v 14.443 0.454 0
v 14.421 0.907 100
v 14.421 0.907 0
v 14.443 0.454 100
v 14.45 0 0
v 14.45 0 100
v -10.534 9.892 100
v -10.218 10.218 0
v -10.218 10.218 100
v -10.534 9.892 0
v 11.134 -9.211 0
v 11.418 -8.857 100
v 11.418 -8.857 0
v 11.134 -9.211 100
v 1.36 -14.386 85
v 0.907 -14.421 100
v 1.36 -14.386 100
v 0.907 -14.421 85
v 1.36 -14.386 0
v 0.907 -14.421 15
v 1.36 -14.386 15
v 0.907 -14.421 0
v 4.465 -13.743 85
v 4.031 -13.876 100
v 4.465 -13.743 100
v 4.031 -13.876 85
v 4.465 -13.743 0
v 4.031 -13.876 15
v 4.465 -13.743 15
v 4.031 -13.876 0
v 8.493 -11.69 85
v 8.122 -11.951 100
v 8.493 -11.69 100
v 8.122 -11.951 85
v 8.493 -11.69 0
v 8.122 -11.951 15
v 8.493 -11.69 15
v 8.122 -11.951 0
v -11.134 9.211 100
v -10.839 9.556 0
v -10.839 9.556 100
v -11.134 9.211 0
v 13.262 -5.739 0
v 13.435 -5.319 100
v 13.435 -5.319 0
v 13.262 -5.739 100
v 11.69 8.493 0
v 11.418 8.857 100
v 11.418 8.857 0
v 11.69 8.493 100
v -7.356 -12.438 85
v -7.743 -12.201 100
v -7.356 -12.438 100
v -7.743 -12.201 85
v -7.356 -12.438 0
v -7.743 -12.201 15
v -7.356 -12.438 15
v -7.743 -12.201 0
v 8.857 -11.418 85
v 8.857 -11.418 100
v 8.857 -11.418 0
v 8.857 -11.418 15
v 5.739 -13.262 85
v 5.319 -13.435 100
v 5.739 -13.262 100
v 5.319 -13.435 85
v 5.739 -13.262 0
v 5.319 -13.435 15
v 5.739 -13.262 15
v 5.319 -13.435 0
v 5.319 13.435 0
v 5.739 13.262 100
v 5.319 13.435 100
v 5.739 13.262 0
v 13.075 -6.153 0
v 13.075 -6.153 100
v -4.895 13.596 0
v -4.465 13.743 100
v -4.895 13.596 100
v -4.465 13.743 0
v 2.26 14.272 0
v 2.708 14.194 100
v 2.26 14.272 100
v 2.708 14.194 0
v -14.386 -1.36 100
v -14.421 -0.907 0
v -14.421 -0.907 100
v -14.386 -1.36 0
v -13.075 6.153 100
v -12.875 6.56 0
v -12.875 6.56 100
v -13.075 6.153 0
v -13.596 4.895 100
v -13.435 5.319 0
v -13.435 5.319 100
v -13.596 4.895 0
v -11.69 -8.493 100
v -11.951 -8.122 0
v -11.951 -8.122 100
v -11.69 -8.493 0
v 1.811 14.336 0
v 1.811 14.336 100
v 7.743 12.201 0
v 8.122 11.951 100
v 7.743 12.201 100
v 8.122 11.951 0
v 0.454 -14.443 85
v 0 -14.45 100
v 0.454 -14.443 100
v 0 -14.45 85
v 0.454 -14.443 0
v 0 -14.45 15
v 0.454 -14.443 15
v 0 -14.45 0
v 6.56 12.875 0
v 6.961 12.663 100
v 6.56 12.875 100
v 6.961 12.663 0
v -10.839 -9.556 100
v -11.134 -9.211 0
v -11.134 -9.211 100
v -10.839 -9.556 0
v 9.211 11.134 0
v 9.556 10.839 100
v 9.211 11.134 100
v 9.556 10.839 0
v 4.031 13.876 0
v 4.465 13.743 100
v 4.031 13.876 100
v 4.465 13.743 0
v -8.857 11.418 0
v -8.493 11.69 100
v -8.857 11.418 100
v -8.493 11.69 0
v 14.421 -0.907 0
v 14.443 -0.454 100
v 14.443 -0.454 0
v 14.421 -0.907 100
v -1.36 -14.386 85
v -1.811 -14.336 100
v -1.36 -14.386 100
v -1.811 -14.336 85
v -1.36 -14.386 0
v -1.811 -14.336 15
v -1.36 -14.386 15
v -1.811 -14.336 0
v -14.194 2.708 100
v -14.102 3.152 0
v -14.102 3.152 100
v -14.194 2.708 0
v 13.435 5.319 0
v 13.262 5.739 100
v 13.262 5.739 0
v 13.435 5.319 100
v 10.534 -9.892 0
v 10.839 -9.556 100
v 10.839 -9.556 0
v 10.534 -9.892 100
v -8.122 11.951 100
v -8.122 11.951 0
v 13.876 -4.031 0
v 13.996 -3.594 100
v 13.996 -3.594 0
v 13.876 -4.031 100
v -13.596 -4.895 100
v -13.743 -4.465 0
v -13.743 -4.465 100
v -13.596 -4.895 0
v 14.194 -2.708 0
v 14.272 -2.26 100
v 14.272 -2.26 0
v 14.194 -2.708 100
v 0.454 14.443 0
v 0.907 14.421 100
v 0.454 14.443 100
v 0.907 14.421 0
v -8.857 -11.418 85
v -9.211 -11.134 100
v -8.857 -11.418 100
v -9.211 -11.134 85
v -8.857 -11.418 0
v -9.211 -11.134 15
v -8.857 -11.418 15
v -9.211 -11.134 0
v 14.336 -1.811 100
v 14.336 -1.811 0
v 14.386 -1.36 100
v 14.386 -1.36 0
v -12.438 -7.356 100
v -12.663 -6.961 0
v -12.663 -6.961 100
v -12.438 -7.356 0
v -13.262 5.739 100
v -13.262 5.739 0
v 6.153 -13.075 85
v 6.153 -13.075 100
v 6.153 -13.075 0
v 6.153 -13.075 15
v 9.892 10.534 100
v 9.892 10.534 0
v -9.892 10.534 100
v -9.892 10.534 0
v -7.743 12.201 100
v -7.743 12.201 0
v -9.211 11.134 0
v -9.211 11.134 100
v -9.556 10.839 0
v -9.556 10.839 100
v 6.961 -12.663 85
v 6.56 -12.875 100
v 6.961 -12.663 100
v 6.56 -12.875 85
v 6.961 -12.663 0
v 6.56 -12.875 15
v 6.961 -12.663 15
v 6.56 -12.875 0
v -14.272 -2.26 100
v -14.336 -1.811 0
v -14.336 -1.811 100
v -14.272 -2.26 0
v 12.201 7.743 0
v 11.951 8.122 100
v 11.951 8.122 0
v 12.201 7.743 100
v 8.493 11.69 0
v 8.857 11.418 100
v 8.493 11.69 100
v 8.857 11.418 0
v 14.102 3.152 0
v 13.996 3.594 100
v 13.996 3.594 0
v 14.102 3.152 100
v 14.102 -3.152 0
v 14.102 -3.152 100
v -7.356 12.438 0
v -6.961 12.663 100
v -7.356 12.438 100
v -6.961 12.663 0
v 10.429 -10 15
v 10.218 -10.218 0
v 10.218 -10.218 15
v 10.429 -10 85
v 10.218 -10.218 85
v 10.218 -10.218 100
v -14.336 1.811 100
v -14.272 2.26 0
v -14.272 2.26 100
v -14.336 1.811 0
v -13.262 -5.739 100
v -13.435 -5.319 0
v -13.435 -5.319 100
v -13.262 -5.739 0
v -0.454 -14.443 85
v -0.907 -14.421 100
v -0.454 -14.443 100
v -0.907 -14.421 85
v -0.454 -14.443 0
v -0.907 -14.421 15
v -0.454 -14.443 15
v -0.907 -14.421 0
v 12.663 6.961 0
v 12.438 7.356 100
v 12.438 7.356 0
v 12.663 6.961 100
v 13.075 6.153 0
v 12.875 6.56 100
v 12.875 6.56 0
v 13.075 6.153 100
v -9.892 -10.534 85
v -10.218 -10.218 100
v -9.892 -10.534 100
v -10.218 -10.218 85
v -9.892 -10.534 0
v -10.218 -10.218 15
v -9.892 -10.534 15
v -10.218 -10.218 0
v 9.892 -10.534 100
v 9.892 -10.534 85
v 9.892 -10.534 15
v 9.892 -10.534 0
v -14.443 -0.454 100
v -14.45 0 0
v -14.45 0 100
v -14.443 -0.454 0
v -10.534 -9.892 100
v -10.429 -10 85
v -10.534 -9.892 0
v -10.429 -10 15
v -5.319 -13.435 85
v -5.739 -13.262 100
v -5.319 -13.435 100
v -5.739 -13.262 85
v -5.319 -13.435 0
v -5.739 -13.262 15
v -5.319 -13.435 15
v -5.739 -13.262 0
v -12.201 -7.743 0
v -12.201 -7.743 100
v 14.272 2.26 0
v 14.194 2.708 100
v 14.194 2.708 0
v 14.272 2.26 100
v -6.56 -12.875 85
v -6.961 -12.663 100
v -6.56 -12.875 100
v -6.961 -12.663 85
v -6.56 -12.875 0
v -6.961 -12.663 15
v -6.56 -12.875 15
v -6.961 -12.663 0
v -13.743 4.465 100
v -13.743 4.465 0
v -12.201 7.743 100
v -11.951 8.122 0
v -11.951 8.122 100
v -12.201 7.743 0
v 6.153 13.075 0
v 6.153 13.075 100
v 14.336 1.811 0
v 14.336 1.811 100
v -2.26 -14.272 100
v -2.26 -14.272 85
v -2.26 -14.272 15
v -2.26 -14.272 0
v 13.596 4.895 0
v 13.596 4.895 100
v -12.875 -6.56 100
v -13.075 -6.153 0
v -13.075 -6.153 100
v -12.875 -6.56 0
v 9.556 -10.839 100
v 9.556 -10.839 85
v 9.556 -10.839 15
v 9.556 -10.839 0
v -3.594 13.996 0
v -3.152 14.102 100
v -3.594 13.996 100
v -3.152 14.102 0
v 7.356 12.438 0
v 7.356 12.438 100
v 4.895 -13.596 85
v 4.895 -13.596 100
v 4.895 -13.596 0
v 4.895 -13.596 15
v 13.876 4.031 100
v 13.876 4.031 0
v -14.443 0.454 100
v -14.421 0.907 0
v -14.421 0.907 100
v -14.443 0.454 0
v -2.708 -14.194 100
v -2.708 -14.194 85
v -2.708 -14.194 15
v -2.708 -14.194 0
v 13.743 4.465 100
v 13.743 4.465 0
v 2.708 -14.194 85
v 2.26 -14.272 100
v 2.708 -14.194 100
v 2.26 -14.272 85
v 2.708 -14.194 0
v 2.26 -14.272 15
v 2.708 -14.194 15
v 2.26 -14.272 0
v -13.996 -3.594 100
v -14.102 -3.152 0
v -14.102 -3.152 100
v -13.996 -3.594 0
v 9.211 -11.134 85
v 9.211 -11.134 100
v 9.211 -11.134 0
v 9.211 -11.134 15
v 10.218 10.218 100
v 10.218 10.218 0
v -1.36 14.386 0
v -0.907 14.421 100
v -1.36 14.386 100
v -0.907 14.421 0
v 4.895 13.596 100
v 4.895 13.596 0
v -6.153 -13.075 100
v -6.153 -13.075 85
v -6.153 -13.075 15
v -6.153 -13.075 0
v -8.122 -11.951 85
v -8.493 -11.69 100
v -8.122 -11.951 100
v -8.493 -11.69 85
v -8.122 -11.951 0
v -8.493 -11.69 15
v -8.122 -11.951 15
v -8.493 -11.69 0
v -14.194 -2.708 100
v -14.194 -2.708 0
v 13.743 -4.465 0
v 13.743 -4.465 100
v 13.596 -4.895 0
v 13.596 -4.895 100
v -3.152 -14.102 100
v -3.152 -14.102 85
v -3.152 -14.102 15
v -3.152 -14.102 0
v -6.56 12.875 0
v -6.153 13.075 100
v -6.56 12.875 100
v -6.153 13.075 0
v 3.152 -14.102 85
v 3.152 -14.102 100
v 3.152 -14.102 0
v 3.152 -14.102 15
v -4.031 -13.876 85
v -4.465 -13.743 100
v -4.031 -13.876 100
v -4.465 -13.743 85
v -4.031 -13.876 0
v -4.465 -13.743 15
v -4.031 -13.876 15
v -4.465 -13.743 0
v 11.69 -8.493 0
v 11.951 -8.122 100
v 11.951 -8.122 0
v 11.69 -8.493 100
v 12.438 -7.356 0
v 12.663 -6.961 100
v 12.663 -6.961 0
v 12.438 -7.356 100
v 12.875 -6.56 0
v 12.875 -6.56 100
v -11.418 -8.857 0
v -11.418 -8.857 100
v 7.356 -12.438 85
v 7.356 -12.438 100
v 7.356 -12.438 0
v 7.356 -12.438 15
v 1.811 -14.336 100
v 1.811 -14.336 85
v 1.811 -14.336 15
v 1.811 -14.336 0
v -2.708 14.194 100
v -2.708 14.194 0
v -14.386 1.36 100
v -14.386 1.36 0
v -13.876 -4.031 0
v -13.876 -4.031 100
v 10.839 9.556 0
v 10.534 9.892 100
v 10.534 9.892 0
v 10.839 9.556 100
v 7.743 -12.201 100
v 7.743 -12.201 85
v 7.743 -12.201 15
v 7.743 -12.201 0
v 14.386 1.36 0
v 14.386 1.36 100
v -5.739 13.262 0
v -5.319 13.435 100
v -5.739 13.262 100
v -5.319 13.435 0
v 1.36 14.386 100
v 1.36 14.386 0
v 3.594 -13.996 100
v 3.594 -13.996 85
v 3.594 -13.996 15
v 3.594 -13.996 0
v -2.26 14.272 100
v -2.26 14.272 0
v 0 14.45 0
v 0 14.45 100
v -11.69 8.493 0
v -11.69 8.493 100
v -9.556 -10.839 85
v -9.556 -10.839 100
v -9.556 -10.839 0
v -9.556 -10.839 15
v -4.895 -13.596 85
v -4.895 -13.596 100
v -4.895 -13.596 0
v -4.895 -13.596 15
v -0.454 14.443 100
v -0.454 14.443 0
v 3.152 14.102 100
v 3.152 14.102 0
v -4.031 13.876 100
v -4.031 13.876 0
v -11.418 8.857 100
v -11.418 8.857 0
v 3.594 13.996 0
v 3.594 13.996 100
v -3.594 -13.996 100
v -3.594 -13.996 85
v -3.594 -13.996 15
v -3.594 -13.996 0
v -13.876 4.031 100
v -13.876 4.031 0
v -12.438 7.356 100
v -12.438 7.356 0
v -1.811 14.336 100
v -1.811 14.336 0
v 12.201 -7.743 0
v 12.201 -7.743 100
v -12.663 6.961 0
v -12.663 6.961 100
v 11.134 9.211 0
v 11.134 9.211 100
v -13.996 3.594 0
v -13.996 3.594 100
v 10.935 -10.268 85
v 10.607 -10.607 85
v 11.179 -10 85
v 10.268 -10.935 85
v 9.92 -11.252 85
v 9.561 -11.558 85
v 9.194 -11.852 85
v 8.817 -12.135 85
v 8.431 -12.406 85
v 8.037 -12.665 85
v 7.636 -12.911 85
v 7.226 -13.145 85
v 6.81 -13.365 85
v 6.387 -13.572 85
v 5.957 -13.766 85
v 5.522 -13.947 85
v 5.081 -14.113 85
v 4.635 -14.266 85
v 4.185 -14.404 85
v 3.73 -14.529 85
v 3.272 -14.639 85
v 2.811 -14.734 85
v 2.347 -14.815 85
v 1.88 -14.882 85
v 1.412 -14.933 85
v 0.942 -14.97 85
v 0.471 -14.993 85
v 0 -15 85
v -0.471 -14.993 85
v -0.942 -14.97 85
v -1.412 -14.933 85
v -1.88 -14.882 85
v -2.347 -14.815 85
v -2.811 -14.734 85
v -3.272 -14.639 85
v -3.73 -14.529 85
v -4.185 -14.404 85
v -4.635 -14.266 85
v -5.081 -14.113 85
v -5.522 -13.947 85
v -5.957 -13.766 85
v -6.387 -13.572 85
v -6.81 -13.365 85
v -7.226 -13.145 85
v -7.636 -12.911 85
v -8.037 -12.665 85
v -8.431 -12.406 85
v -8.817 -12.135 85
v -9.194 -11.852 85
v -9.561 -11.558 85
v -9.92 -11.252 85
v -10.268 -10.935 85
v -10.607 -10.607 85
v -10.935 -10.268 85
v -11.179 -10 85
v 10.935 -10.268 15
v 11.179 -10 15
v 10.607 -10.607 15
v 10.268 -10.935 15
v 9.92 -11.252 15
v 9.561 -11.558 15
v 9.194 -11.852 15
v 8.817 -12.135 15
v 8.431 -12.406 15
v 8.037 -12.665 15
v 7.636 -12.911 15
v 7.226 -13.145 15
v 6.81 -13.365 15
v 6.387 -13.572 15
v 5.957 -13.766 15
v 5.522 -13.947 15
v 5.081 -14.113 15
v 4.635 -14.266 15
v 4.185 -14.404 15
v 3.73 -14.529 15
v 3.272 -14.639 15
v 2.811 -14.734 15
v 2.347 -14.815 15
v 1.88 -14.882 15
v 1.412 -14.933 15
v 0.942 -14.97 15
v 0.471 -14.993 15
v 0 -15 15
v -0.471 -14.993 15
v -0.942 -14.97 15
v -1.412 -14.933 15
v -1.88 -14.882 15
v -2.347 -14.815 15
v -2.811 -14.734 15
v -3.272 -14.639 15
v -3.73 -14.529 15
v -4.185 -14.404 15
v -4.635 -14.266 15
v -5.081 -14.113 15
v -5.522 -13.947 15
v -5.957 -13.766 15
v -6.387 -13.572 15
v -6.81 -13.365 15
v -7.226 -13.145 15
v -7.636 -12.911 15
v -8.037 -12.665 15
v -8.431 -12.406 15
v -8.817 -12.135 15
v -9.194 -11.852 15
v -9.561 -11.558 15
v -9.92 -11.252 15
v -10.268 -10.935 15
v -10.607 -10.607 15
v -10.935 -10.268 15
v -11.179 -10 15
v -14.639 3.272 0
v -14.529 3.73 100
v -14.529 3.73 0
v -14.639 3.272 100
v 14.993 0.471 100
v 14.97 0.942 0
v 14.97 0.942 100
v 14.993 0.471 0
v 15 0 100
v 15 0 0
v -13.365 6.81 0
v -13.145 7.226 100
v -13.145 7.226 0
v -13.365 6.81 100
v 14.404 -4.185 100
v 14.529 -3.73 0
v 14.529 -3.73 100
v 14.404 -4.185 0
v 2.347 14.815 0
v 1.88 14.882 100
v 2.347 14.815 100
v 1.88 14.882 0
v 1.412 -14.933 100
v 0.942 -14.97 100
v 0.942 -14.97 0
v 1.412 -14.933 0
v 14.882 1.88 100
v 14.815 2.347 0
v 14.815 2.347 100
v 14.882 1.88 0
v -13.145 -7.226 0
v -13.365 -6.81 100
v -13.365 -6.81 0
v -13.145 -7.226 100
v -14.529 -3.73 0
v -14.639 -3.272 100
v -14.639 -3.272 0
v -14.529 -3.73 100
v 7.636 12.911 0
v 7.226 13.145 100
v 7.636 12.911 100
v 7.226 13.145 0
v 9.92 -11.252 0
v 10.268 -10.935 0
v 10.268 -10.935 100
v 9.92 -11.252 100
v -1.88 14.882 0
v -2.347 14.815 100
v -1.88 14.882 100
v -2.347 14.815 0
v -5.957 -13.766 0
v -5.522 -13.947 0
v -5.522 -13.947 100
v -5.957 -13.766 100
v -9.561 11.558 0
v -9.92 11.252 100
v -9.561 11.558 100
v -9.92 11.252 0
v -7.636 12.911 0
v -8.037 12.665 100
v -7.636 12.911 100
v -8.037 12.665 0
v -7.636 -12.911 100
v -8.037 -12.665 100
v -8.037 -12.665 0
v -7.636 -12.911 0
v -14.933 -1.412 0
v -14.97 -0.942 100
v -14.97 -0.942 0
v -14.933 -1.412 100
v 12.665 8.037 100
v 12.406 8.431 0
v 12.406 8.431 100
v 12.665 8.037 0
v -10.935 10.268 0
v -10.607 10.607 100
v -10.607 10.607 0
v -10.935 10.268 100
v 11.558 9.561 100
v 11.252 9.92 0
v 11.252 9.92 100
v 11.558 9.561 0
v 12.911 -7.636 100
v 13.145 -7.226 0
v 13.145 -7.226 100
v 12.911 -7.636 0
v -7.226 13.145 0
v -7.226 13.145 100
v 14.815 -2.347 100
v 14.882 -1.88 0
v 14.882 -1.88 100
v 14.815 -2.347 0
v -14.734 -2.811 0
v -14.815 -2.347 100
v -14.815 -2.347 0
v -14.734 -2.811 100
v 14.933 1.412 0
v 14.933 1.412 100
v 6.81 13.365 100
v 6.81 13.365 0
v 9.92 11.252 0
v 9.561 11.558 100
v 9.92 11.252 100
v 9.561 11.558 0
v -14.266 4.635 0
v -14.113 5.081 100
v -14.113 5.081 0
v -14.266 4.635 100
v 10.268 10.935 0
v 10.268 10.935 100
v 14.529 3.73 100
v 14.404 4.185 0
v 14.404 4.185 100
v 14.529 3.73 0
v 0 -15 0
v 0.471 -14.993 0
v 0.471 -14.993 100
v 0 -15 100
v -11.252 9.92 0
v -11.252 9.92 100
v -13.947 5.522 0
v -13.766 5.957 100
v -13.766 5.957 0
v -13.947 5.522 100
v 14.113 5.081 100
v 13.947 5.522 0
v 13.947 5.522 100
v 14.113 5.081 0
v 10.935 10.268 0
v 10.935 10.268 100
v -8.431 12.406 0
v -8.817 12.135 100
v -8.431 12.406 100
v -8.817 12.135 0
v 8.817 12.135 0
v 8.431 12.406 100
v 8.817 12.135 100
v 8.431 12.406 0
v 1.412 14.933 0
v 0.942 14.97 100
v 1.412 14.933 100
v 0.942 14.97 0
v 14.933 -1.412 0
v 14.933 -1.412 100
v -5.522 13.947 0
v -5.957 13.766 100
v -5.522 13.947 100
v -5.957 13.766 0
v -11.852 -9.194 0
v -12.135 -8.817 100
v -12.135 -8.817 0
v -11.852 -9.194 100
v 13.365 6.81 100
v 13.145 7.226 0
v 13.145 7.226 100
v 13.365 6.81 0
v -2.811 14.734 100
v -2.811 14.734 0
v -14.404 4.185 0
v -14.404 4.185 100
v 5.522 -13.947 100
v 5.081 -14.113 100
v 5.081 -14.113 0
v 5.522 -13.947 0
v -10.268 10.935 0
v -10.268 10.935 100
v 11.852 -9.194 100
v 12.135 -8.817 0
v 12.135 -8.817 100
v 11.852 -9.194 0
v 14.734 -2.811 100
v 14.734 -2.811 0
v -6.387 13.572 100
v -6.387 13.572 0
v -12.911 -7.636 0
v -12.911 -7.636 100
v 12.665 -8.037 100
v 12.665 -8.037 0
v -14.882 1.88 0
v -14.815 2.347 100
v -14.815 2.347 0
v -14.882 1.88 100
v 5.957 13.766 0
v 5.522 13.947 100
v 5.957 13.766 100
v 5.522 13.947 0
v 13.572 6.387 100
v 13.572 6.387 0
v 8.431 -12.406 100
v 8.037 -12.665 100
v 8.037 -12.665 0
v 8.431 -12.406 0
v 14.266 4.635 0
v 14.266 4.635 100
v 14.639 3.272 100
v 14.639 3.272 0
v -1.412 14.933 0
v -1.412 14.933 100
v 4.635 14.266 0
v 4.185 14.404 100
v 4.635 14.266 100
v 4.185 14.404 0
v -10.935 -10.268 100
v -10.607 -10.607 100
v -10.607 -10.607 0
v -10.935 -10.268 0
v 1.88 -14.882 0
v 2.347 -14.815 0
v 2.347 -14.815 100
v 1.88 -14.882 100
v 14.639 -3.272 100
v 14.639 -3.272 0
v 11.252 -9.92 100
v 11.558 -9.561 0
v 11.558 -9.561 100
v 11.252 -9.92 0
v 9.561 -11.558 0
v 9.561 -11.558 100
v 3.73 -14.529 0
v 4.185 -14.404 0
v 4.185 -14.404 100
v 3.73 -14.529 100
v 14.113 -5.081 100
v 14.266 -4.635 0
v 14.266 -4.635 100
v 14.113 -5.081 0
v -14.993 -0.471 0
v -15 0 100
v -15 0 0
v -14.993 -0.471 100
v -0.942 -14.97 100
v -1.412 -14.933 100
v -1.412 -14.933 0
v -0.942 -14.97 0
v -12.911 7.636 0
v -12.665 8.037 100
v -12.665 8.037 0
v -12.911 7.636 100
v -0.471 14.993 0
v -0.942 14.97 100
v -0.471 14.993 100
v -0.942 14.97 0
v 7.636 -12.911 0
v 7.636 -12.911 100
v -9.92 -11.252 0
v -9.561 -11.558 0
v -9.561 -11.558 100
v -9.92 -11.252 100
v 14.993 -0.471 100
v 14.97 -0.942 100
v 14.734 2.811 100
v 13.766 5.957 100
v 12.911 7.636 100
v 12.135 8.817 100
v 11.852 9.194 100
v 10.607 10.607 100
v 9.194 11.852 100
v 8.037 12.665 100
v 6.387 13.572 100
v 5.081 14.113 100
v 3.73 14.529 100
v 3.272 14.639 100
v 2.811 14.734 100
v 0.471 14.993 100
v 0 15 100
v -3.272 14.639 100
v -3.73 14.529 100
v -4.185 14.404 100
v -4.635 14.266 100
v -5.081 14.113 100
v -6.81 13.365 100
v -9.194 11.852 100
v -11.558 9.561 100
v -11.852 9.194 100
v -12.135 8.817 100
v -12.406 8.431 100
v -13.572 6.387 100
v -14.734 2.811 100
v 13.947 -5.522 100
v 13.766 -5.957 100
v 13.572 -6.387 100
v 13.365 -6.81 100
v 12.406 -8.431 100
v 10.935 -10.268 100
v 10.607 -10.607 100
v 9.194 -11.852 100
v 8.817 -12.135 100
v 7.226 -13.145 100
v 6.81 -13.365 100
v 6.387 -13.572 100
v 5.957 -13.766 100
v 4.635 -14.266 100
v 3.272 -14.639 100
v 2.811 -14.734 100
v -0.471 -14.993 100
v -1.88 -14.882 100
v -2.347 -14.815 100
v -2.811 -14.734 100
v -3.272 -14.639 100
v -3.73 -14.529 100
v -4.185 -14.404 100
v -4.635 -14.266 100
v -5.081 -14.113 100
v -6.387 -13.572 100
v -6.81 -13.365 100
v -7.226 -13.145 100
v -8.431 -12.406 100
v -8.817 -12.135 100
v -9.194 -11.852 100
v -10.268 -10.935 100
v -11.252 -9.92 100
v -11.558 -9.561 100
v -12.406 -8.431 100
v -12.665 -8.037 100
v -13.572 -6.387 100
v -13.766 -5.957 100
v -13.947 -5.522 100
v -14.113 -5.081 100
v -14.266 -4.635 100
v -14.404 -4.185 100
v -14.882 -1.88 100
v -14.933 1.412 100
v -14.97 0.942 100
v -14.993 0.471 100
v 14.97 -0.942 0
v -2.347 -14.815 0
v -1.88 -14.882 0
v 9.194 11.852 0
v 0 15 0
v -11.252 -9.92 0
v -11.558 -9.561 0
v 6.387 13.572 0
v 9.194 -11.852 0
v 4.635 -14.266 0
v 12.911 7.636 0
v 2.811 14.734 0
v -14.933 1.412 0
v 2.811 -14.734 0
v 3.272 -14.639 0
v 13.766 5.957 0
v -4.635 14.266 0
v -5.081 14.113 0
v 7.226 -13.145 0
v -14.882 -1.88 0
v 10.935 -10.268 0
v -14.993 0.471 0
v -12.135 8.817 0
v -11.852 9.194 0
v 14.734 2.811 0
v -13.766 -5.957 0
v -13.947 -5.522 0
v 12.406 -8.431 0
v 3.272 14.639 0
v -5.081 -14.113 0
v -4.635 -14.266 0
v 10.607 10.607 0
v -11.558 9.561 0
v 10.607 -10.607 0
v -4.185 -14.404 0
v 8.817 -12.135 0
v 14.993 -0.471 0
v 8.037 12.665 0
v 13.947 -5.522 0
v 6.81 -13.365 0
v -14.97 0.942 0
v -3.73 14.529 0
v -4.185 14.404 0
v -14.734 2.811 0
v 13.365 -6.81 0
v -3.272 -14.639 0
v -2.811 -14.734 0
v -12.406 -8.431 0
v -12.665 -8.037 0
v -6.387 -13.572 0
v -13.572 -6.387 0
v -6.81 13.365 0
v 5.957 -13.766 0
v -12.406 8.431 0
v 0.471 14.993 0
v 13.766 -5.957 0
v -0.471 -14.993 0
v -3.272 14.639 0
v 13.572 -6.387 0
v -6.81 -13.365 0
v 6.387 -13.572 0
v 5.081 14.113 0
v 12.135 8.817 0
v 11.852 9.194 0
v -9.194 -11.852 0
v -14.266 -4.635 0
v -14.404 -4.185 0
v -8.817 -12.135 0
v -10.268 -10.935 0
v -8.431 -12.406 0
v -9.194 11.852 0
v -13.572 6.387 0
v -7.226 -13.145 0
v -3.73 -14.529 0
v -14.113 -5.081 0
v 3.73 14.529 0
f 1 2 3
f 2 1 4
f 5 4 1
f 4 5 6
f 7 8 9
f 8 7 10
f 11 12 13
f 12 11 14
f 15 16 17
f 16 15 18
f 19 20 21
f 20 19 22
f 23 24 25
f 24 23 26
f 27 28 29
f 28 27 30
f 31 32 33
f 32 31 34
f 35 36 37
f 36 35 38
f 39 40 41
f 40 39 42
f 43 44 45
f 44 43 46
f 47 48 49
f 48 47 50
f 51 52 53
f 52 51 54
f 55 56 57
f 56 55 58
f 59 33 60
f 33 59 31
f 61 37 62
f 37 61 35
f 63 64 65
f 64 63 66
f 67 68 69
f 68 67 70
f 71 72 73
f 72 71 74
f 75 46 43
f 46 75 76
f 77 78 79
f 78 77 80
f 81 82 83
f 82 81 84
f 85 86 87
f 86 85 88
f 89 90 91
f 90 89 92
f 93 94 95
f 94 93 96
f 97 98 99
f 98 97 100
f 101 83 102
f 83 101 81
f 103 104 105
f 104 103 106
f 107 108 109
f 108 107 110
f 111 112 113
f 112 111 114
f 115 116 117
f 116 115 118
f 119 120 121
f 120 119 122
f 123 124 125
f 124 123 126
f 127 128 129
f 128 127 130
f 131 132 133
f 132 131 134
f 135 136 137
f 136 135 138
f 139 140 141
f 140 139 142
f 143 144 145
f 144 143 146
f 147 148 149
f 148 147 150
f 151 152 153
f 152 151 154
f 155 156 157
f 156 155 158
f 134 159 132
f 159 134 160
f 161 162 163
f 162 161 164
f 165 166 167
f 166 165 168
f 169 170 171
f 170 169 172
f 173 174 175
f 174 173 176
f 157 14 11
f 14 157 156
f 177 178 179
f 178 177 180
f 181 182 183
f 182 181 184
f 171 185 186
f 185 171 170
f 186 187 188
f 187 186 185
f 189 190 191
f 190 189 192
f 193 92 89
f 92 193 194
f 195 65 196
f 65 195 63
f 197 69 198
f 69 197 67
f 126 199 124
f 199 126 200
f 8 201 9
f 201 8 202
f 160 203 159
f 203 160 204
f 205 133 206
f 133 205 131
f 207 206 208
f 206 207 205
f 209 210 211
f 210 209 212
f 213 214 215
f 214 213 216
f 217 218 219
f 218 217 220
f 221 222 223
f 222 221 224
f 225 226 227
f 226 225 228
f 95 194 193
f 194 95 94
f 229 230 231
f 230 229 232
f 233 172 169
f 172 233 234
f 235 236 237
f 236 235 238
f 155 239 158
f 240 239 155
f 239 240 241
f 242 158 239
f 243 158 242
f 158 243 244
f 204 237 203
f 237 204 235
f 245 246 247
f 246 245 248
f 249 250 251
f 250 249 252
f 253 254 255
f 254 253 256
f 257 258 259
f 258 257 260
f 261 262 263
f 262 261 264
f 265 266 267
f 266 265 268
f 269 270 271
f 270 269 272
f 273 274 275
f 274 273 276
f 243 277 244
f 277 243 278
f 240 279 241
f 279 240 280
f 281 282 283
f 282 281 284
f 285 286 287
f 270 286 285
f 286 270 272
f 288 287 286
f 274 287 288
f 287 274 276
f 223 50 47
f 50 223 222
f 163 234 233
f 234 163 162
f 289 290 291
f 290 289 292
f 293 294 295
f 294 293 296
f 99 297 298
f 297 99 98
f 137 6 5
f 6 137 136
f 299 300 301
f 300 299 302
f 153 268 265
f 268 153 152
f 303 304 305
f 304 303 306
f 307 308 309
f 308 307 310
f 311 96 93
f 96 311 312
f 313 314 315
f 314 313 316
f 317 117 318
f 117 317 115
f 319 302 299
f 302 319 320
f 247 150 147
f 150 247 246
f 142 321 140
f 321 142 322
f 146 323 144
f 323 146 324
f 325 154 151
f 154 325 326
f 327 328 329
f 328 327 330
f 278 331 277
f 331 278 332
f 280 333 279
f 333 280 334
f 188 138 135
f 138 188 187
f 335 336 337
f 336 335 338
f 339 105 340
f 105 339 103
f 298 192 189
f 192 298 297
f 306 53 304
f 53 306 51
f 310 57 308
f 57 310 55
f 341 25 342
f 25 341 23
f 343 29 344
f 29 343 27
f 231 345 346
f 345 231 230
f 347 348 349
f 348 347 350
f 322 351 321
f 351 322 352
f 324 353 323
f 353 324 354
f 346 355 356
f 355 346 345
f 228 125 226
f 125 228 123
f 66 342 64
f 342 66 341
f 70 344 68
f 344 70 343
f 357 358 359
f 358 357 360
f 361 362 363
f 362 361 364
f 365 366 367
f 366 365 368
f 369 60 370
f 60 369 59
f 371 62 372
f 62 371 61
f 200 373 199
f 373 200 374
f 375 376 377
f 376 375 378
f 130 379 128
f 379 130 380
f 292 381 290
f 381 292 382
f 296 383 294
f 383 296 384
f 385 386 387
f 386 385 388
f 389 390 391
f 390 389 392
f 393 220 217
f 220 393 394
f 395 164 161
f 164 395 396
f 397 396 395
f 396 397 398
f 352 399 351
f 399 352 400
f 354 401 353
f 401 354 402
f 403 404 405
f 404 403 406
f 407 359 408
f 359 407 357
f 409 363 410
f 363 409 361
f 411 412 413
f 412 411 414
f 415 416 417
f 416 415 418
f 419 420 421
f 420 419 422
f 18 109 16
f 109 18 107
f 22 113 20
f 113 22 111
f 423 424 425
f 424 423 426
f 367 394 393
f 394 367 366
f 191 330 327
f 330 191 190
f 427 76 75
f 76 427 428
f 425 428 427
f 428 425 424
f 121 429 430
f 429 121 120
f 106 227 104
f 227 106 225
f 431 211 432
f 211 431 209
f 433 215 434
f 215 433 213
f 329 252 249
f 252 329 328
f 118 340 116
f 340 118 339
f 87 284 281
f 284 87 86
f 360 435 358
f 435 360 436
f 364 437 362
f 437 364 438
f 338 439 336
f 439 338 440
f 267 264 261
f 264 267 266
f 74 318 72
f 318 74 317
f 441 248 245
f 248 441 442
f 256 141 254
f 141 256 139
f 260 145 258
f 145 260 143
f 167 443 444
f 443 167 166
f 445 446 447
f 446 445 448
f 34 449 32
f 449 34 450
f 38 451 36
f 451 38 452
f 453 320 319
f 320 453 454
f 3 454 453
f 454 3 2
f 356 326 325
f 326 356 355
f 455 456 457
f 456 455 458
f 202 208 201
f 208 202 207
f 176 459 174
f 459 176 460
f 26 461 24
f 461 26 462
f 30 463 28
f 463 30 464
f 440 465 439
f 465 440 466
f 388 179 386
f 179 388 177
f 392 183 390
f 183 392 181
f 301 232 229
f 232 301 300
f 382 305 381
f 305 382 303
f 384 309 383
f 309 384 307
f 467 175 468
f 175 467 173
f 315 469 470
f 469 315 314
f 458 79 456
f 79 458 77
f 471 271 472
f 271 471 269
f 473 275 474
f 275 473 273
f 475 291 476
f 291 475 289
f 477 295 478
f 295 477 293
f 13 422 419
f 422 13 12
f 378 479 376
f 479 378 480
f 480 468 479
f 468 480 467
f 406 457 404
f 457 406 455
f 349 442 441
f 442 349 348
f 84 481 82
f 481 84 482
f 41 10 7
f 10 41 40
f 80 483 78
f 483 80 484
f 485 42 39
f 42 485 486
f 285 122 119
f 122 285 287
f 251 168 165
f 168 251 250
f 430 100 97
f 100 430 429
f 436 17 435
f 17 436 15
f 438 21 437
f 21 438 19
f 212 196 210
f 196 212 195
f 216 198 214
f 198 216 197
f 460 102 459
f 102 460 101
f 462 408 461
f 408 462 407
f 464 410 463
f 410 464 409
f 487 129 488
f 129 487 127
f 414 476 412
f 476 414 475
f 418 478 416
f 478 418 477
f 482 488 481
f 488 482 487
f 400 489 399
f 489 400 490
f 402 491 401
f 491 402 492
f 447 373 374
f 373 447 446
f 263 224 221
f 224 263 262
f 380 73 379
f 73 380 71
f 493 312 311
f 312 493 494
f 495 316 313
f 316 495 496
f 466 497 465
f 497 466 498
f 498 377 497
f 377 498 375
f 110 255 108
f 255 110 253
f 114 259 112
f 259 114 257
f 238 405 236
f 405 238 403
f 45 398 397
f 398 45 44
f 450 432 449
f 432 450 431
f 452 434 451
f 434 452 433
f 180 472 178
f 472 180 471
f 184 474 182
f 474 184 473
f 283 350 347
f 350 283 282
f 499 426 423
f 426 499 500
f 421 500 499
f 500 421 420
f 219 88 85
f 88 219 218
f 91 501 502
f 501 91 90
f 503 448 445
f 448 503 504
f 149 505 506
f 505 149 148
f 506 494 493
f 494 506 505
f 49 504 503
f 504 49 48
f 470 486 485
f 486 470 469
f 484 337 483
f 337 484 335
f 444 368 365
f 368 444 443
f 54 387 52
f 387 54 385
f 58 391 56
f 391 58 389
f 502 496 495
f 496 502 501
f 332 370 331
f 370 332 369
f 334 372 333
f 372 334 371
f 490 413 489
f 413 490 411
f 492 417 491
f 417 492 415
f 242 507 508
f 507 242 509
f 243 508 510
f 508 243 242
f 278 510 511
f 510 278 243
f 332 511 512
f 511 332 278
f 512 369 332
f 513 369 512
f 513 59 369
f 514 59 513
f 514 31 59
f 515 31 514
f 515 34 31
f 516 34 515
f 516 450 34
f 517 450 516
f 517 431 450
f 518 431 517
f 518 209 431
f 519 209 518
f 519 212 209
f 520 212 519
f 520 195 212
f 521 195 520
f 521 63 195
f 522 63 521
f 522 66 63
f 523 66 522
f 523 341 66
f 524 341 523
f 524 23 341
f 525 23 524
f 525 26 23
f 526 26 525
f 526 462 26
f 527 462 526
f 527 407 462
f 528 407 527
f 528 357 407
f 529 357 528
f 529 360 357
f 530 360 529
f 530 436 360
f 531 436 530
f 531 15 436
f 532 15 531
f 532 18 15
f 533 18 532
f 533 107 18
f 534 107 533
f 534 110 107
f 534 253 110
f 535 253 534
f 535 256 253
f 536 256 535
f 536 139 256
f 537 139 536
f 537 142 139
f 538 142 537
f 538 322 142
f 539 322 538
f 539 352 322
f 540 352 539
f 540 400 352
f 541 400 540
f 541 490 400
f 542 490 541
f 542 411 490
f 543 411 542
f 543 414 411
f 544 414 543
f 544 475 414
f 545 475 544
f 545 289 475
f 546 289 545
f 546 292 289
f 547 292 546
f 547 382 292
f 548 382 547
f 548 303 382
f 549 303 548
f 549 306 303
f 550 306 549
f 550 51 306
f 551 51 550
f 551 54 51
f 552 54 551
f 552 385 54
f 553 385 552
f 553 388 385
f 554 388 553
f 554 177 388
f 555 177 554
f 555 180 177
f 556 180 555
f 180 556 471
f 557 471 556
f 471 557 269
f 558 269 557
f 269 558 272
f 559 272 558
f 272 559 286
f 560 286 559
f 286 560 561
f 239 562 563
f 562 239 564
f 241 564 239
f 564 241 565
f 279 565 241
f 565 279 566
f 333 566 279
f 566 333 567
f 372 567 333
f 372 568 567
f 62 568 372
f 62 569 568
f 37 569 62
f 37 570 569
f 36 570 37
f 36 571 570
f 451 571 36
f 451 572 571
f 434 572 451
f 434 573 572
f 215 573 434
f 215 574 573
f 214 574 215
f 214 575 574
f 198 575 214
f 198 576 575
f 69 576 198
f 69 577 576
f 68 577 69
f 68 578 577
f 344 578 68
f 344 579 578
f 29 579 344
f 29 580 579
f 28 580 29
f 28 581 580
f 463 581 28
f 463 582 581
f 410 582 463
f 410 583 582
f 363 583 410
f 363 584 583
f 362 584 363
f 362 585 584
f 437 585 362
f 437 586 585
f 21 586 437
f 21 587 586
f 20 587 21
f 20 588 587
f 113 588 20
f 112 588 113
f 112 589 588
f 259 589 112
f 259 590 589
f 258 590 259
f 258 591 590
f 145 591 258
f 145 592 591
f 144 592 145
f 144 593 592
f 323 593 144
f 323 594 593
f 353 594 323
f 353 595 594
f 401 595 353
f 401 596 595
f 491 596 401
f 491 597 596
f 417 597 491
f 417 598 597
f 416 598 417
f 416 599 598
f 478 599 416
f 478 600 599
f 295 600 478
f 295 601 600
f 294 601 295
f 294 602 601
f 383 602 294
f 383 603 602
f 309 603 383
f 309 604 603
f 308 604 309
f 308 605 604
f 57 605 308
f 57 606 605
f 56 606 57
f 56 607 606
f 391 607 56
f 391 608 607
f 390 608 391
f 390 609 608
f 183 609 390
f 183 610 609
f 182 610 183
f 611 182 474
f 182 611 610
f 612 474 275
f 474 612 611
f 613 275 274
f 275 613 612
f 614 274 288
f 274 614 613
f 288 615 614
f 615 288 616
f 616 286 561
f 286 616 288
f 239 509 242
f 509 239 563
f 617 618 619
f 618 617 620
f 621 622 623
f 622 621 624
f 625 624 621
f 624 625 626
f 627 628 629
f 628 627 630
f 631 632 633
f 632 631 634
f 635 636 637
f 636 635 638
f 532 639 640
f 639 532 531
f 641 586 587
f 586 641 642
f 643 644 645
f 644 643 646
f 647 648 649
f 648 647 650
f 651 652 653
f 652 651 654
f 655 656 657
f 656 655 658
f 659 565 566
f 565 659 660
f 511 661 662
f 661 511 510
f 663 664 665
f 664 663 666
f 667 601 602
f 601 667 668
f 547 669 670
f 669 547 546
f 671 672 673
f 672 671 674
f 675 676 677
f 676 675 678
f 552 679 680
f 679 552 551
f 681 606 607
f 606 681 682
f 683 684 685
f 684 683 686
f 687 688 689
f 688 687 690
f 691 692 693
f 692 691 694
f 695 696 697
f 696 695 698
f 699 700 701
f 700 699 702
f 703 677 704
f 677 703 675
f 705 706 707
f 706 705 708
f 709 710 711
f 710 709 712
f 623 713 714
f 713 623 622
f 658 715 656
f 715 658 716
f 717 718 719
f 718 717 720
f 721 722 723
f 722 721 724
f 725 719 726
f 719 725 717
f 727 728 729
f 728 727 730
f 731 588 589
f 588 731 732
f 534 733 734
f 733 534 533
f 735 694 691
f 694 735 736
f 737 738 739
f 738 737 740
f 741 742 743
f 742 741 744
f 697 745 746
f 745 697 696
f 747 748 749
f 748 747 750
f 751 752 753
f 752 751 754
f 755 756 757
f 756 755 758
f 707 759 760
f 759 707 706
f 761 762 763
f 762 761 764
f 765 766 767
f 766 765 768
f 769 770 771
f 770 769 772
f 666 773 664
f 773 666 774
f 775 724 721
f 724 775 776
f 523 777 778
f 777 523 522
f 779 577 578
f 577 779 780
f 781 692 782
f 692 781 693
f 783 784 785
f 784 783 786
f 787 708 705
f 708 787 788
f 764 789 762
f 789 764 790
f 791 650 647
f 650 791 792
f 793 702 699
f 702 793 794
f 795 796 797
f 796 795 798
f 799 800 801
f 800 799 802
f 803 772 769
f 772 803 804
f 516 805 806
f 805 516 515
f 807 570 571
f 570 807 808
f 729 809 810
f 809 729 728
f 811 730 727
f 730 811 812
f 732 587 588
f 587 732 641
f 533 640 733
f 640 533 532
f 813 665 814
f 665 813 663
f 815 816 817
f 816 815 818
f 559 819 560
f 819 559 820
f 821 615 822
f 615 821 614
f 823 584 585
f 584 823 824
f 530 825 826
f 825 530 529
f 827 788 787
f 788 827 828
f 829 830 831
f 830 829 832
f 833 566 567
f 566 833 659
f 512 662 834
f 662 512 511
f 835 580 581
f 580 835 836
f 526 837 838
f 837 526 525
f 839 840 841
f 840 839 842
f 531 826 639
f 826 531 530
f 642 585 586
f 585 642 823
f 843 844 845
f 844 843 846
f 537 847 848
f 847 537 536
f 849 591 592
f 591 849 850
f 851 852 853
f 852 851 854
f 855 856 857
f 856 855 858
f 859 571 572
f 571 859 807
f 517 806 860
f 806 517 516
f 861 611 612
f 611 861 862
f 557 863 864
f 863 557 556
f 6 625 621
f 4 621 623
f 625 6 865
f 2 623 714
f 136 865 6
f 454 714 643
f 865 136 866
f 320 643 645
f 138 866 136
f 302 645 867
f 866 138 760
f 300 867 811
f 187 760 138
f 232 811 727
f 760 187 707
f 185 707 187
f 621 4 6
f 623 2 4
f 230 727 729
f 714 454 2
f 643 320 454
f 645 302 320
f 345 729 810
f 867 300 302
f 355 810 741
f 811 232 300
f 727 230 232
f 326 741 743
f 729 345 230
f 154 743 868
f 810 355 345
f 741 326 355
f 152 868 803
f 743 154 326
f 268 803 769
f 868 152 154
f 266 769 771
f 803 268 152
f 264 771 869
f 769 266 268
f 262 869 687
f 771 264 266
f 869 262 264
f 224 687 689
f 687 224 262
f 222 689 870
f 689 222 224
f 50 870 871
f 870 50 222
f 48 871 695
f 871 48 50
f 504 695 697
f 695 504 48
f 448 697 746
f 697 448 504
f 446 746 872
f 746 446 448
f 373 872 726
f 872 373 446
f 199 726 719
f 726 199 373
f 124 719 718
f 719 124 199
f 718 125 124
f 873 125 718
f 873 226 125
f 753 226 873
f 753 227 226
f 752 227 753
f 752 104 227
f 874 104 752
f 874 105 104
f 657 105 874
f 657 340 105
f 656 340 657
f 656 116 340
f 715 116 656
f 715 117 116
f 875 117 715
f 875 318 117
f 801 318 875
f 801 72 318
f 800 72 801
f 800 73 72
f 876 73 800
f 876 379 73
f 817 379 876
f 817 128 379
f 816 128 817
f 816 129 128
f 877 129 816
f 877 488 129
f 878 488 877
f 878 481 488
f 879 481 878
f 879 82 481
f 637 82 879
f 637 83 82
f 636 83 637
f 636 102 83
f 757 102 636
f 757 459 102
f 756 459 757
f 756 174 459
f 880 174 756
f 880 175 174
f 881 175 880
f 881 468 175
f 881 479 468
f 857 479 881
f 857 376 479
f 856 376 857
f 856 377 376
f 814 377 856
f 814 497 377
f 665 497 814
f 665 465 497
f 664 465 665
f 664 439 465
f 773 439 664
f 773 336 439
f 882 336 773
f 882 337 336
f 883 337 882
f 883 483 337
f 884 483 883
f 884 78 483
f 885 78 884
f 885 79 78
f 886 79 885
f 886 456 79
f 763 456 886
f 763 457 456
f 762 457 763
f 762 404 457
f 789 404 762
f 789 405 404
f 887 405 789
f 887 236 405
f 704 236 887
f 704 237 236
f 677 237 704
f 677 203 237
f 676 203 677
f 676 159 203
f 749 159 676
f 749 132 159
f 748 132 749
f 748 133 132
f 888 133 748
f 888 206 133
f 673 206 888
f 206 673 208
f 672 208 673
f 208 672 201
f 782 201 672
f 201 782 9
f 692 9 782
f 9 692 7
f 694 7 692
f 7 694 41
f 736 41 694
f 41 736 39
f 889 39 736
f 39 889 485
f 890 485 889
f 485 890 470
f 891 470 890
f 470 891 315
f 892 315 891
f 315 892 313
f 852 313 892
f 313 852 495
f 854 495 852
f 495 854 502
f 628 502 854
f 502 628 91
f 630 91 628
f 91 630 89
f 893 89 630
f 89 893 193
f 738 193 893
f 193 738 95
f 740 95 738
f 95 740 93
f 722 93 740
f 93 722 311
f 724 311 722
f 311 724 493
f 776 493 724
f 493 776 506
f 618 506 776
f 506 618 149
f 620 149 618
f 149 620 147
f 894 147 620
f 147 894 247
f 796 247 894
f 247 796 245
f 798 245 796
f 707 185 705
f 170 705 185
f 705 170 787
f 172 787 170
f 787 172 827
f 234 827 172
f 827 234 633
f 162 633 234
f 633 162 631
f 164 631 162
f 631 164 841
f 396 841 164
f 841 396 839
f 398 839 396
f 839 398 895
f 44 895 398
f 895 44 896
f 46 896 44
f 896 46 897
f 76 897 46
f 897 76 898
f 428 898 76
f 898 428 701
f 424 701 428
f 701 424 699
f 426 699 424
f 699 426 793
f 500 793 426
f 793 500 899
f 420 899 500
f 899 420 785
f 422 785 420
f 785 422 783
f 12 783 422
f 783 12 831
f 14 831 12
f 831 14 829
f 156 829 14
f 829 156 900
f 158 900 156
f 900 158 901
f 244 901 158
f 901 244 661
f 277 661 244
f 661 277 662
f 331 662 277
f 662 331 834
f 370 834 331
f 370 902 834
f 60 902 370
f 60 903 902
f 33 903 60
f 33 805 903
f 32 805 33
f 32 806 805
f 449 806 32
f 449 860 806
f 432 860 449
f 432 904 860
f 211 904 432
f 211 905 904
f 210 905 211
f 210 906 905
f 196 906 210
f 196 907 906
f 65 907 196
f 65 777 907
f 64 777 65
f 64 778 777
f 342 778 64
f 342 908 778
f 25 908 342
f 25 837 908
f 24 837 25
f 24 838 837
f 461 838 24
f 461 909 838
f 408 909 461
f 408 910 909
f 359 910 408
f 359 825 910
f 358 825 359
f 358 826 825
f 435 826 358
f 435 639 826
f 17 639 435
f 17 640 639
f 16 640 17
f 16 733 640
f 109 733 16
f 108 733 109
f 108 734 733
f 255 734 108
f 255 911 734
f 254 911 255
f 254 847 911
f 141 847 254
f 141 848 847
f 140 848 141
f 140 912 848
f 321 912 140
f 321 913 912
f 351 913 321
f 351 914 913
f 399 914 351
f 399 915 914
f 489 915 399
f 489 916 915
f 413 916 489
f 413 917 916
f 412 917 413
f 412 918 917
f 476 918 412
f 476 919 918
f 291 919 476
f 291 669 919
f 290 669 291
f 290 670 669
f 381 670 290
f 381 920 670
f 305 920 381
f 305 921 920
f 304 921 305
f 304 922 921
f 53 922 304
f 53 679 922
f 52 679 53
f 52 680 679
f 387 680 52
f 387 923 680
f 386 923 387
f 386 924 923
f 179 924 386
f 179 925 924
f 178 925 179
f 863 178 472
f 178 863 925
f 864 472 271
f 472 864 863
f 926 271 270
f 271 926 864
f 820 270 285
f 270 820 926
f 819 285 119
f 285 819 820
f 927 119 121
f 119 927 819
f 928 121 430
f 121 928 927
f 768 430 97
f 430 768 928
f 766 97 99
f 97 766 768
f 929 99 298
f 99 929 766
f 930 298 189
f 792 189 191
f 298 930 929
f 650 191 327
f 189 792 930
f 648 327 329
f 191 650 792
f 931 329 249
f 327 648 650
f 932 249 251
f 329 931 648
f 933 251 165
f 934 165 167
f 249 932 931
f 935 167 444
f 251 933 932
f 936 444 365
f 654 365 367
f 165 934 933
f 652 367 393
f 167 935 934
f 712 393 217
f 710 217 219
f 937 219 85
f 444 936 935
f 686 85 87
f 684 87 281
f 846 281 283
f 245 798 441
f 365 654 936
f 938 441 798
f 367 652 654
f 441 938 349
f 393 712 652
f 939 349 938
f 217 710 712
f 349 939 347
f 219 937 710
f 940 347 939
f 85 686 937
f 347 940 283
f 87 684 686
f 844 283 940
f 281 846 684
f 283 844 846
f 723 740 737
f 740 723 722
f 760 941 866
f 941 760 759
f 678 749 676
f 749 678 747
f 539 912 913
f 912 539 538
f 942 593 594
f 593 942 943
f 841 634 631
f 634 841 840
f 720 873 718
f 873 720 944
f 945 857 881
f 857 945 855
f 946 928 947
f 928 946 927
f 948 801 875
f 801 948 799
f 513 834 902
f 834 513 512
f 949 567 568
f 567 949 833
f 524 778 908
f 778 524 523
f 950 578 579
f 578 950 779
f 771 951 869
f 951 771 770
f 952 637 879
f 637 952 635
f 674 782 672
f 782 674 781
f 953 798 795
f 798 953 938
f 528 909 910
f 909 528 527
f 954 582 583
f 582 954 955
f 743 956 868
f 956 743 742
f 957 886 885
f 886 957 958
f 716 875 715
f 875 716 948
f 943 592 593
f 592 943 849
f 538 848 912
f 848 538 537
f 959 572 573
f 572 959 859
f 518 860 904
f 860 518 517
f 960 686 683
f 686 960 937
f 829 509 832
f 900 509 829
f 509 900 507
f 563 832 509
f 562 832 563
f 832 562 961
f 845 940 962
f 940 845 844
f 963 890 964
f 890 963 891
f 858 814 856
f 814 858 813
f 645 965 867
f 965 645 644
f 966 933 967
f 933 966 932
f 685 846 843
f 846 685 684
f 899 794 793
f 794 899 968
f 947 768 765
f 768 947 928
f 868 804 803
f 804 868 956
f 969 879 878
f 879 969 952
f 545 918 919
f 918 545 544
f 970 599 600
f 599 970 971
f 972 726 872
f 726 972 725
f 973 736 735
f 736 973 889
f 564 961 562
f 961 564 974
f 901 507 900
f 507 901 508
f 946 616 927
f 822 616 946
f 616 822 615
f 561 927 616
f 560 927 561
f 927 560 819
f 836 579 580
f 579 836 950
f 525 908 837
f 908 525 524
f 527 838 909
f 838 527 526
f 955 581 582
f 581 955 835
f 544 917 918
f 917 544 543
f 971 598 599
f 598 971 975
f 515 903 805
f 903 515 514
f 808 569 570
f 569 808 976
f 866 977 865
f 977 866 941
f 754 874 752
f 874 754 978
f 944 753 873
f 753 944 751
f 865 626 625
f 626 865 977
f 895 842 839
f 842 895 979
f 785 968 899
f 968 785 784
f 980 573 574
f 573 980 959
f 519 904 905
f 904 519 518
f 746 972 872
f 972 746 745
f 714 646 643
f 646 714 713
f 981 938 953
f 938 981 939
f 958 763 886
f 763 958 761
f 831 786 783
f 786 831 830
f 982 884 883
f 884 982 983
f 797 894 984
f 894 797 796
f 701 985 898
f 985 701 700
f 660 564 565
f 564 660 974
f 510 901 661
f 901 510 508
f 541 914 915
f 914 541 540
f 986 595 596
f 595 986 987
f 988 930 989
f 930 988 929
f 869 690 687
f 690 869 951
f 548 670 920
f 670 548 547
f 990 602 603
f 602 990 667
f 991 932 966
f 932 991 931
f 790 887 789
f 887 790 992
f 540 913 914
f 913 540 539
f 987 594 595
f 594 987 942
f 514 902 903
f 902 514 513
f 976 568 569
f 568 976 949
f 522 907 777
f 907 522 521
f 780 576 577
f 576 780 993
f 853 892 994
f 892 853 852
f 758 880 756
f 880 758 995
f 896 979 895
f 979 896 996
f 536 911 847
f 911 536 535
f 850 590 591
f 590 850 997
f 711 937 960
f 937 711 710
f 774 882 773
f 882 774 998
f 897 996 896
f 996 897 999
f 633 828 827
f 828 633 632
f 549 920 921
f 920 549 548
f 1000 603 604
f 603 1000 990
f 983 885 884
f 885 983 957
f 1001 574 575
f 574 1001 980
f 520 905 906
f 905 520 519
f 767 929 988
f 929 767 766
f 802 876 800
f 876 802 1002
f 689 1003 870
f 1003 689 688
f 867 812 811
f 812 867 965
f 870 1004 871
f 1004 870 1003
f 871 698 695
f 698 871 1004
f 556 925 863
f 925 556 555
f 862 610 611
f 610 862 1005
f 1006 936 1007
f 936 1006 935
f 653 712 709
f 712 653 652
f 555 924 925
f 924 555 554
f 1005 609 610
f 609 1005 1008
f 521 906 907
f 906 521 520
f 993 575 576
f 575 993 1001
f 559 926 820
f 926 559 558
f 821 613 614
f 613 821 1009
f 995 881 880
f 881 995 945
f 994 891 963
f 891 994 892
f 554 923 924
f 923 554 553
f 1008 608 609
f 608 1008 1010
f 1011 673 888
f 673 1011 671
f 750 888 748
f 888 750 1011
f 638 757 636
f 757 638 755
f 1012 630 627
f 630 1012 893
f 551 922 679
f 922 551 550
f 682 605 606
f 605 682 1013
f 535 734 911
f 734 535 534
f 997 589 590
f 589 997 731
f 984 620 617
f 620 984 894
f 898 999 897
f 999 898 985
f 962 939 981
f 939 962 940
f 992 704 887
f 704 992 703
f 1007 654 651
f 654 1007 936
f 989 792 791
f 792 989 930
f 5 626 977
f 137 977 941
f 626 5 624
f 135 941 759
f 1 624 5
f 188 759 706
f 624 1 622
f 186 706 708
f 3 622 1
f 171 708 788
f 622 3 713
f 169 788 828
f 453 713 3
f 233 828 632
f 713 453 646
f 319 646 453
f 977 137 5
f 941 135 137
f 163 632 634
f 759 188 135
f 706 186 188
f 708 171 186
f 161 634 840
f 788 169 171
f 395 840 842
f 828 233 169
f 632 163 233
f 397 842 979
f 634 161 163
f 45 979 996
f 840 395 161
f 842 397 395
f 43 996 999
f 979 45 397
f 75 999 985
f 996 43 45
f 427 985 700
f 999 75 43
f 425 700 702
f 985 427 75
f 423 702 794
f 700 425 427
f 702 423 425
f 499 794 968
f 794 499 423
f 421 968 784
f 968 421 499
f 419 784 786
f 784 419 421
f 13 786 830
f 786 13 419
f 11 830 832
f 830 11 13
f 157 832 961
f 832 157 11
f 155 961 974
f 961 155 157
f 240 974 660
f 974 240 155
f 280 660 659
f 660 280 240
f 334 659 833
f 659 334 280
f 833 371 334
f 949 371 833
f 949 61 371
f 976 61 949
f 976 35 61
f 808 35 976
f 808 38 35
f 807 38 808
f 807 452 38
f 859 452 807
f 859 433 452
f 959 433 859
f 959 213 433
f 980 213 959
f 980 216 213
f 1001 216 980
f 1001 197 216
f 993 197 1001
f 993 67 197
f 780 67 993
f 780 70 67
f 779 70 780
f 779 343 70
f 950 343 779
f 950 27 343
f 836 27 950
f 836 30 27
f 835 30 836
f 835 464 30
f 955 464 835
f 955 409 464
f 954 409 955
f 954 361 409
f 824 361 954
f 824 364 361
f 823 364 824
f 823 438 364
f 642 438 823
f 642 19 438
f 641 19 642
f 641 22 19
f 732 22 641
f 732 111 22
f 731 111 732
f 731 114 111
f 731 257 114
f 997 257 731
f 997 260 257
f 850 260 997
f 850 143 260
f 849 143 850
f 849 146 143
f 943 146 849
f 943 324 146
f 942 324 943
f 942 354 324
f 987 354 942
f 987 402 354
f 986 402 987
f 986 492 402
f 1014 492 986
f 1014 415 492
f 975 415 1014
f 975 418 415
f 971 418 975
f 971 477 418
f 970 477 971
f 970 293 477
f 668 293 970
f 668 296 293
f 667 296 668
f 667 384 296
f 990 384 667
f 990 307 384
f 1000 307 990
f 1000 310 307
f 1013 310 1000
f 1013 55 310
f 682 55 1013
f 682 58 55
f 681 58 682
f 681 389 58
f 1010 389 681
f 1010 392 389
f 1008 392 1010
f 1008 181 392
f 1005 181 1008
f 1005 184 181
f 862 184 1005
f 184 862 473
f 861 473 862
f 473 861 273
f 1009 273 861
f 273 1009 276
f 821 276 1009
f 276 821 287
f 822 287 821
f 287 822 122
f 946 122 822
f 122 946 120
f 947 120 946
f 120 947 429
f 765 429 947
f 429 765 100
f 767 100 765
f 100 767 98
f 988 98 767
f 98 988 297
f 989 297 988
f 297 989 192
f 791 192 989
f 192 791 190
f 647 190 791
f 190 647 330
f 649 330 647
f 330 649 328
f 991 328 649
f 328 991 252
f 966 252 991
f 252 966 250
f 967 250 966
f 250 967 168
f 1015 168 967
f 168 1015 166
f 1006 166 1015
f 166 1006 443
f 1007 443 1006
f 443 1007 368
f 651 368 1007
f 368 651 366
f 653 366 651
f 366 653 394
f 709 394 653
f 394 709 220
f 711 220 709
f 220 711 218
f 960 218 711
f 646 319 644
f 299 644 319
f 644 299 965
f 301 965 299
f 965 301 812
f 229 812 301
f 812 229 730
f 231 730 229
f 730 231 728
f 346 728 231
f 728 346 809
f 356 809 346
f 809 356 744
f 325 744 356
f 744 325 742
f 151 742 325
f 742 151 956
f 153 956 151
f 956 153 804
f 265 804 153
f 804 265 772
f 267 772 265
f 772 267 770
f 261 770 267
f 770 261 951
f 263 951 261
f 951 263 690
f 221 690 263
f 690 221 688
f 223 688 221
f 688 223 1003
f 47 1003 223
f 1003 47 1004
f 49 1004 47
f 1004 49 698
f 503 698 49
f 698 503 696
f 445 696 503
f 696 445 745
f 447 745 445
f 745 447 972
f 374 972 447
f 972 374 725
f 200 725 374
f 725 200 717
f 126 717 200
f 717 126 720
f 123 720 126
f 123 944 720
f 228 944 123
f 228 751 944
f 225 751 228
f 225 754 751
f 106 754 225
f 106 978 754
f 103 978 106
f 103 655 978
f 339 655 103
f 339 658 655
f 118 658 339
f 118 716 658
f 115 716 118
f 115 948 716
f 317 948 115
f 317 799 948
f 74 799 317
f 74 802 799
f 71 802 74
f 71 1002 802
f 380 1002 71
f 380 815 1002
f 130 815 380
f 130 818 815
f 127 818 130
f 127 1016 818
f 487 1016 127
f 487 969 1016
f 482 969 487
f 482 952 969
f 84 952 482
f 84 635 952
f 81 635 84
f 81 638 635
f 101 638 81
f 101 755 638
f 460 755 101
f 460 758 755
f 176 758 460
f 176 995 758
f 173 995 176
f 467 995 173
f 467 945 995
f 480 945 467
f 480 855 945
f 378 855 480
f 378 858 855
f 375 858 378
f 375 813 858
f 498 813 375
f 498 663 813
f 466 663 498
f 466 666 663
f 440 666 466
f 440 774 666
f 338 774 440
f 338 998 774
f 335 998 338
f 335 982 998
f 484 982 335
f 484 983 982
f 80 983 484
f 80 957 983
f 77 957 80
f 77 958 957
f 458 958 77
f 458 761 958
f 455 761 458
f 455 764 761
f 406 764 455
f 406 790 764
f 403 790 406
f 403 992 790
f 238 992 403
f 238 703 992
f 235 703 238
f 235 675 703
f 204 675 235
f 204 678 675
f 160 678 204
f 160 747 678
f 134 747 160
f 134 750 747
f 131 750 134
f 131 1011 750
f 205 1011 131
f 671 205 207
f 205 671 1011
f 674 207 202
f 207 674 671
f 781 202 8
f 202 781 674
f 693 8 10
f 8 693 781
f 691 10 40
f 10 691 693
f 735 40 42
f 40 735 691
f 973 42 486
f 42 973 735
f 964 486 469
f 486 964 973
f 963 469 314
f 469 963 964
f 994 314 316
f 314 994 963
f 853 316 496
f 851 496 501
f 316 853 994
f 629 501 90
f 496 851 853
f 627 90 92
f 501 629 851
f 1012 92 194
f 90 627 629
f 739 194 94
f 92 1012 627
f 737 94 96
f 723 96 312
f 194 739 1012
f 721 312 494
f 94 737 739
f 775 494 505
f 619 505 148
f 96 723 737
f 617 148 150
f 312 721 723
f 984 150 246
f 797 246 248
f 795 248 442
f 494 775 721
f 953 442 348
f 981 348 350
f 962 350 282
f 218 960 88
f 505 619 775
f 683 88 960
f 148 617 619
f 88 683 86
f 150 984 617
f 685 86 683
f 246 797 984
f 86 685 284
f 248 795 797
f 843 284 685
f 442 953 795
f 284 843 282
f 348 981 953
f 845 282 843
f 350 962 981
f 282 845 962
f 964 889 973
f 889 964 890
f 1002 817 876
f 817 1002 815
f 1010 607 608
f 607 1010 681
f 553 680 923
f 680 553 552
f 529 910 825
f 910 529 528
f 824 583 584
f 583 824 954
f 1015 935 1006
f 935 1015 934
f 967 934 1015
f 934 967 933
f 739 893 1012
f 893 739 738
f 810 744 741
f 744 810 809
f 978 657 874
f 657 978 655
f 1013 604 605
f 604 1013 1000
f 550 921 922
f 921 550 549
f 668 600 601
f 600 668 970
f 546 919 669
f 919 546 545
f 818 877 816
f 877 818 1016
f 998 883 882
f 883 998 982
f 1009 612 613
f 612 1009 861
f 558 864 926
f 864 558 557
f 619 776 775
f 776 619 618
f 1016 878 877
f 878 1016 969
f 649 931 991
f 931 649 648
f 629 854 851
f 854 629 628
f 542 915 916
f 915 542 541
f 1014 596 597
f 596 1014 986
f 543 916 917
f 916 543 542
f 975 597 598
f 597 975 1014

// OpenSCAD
//Diameter of cylinder
diameter=30;
//Width of single wall layer
extrusionWidth=0.55;
//Height of cylinder
height=100;
//Height/thickness of bottom (0 for no bottom)
layerHeight=0;
//height of viewport
viewportheight=70;
//viewport width
viewportoffset=-10;
/* [hidden] */
rad=diameter/2;
$fn=200;

union() {
translate([0,0,-layerHeight]) cylinder(r=rad, h=layerHeight);
	difference () {
		cylinder(r=rad, h=height);
        union()
        {
            translate([0,0,-1])
            cylinder(r=rad-extrusionWidth, h=height+2);
            translate([-rad*2,-rad*2+viewportoffset,height/2-viewportheight/2])
            cube(size=[rad*6,rad*2,viewportheight]);
        }
	}
}
